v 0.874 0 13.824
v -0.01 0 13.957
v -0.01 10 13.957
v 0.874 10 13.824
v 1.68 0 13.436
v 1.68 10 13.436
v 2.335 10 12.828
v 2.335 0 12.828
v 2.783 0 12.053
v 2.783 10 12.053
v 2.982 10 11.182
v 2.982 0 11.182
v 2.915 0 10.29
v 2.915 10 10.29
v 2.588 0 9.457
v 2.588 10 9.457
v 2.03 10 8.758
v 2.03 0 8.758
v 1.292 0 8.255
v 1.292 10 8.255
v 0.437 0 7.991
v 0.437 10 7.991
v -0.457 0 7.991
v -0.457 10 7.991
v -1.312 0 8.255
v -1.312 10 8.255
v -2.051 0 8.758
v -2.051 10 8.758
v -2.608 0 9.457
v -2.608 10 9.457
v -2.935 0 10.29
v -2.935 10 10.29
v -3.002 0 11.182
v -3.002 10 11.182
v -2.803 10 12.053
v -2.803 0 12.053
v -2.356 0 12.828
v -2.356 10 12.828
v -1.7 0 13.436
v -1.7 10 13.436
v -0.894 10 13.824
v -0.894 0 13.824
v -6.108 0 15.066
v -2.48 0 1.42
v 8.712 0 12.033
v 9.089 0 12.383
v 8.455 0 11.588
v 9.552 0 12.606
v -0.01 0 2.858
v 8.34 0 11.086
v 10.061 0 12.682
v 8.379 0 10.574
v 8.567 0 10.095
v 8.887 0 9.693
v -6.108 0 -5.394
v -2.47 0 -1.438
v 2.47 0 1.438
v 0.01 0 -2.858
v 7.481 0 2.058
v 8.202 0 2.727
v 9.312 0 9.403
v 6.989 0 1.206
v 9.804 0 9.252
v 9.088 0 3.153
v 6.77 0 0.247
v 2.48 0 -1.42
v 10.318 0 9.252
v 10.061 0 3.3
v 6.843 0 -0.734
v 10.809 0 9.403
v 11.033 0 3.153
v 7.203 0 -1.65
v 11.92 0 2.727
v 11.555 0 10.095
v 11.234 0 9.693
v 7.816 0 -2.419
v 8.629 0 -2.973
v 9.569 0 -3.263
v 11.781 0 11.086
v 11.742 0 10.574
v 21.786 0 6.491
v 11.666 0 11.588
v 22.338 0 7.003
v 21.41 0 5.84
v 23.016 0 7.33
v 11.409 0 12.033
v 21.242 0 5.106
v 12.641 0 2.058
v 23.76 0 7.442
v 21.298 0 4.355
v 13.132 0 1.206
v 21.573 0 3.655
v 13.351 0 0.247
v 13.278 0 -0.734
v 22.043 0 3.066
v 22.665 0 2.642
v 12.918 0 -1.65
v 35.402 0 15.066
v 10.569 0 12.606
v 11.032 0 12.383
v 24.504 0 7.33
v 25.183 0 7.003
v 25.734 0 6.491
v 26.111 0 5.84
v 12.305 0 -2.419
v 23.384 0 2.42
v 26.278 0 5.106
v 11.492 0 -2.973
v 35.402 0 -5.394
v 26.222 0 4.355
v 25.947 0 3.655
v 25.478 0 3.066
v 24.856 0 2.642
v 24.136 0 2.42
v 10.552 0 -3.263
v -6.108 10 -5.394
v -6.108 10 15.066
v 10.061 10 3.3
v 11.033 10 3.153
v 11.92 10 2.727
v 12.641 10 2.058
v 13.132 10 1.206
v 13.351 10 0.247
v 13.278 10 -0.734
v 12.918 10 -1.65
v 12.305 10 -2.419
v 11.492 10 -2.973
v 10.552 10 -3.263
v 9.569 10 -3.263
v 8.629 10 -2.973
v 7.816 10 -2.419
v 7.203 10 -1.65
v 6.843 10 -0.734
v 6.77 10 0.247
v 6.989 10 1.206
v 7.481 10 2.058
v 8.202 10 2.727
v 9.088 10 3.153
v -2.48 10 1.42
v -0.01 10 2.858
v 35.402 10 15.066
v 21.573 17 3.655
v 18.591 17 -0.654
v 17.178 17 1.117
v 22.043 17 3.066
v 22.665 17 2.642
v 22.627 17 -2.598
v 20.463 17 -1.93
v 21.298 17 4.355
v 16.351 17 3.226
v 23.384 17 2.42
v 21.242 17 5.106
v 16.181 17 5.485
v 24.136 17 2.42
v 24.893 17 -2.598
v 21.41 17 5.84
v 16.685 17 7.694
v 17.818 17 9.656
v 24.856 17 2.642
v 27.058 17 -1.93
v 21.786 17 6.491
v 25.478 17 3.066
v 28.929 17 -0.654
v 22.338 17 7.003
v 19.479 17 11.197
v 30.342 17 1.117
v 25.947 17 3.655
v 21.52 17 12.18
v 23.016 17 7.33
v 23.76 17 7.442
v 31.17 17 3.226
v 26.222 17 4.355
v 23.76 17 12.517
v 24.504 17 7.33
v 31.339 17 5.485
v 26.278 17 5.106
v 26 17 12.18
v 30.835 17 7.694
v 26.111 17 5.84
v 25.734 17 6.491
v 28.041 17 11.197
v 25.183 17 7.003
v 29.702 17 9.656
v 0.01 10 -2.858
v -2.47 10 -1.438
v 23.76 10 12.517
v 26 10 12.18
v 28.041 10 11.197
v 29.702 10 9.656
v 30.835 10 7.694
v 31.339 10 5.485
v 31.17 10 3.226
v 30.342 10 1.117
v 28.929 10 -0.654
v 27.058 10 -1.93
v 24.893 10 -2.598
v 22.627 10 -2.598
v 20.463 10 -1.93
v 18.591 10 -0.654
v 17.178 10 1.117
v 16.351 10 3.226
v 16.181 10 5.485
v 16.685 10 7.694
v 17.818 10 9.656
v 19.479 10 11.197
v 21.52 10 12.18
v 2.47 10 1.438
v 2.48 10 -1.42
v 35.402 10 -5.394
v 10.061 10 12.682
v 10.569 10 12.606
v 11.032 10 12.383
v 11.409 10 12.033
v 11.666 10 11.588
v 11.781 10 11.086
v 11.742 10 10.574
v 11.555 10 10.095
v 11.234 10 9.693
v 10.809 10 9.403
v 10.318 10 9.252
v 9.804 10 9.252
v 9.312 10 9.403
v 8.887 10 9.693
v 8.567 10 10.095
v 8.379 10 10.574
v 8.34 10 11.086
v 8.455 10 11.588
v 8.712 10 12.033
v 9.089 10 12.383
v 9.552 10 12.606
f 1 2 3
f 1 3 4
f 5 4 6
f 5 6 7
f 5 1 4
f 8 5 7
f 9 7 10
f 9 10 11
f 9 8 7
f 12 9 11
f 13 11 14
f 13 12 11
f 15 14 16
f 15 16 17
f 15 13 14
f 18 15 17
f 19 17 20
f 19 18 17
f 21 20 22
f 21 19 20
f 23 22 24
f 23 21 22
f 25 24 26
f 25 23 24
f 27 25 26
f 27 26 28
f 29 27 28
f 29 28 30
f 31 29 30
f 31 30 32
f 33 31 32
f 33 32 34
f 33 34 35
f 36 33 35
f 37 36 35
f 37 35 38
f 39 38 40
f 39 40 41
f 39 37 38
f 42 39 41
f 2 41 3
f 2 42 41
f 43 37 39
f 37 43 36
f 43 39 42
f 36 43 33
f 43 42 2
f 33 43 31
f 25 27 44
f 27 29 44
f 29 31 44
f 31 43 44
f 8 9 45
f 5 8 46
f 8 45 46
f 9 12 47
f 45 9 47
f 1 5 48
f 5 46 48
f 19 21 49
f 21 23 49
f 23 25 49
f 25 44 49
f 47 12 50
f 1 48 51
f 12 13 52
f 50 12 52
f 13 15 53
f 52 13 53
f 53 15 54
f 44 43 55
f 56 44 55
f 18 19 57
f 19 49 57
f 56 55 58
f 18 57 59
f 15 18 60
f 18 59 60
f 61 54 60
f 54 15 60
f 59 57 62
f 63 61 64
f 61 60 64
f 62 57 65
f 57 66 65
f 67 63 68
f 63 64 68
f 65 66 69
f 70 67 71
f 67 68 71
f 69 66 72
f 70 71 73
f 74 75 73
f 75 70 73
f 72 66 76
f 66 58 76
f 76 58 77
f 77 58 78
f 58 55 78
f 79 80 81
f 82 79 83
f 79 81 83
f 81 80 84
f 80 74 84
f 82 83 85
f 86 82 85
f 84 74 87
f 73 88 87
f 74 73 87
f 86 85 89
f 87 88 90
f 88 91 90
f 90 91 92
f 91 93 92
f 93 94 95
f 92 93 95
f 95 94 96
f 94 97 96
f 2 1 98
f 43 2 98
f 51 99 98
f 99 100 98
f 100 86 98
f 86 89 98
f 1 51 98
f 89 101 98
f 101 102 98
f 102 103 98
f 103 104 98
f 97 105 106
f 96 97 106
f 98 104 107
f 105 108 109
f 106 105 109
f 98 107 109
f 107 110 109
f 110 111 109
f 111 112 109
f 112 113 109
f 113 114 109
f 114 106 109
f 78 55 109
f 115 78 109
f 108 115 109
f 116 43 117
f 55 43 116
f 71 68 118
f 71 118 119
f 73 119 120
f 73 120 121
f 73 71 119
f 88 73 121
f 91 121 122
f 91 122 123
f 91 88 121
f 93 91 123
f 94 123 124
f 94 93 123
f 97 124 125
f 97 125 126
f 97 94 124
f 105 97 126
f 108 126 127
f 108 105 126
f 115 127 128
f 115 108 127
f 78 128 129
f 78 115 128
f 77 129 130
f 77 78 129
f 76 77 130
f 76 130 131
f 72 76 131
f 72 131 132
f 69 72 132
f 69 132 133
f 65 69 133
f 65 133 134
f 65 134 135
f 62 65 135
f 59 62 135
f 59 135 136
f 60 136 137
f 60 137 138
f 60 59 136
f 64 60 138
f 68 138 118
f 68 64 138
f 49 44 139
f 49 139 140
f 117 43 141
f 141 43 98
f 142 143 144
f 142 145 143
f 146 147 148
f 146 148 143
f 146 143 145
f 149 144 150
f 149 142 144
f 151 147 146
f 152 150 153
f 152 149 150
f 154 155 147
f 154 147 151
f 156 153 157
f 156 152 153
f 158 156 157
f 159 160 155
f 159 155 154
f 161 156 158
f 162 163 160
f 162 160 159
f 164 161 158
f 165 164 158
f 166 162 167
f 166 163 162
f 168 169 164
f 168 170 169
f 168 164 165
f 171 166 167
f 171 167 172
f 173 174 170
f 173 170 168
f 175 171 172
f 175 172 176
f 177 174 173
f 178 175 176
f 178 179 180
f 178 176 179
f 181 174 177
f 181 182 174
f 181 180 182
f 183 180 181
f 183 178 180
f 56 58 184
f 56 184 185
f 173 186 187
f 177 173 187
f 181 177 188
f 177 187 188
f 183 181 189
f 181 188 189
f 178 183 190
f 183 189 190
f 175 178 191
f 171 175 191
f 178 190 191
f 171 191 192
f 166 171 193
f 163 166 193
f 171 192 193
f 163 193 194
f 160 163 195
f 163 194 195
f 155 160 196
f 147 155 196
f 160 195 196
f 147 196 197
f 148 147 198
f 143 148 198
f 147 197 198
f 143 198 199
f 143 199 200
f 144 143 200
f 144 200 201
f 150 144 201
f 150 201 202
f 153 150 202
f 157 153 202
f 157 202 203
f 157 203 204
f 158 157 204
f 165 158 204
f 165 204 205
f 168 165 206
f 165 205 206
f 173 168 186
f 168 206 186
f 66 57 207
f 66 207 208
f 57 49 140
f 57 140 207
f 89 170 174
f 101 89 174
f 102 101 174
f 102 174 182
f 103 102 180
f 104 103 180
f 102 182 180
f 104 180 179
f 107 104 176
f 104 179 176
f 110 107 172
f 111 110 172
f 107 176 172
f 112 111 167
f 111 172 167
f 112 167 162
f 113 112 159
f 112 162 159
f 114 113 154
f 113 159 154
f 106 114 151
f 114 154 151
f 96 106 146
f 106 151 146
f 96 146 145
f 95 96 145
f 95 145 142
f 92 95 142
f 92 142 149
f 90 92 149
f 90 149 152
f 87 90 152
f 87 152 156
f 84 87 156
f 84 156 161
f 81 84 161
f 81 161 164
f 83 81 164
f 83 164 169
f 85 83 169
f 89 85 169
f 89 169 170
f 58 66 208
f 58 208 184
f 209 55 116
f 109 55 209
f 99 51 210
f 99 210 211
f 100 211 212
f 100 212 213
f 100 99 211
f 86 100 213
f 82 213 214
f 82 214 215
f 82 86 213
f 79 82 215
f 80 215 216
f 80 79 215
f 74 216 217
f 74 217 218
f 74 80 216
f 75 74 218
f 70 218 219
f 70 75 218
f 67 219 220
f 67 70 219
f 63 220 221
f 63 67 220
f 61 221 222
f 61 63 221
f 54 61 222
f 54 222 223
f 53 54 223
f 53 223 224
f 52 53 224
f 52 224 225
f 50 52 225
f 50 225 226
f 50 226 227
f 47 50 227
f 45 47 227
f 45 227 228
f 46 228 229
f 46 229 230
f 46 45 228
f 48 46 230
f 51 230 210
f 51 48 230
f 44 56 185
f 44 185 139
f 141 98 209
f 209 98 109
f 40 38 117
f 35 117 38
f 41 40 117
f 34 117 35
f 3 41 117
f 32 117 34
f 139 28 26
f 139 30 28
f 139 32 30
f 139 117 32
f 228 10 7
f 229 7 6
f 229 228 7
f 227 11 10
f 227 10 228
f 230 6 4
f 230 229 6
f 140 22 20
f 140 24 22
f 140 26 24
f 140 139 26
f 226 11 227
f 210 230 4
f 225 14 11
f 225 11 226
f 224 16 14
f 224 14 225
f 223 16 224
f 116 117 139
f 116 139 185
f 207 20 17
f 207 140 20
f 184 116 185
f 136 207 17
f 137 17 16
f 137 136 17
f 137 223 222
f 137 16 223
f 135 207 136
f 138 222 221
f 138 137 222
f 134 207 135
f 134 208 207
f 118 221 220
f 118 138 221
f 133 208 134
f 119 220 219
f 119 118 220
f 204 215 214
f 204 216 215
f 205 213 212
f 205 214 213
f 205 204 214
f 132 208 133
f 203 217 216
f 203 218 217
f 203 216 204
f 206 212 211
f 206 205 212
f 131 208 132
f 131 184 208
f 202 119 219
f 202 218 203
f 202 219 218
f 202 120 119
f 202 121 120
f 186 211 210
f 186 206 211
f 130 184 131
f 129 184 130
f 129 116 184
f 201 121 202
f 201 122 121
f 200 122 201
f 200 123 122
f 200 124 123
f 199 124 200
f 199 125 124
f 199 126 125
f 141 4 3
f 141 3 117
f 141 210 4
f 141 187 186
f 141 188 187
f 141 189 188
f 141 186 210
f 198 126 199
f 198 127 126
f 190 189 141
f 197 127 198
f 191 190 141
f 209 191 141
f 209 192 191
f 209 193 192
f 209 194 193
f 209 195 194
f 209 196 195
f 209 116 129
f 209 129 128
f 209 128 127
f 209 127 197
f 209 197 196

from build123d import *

# Parameters (mm, degrees)
SKETCH1_W           = 41.509557428
SKETCH1_H           = 20.45985577
SKETCH1_R           = 3
SKETCH1_R_2         = 3.3
SKETCH1_R_3         = 1.725
BOSS_EXTRUDE1_DEPTH = 10
SKETCH2_R           = 7.6
BOSS_EXTRUDE2_DEPTH = 7
SKETCH3_R           = 2.525
CUT_EXTRUDE1_DEPTH  = 43.062691409


with BuildPart() as part:
    # Sketch1 → Boss-Extrude1 (new body)
    with BuildSketch(Plane(origin=(0, 0, 0), x_dir=(1, 0, 0), z_dir=(0, 1, 0))):
        with Locations((14.647059063, -4.835923918)):
            Rectangle(SKETCH1_W, SKETCH1_H)
        with Locations(Location((-0.01006999, -10.957446633, 0), (0, 0, 270))):
            Circle(SKETCH1_R, mode=Mode.SUBTRACT)
        with Locations(Location((10.060612969, 0, 0), (0, 0, 270))):
            Circle(SKETCH1_R_2, mode=Mode.SUBTRACT)
        with Locations(Location((10.060612969, -10.957446633, 0), (0, 0, 270))):
            Circle(SKETCH1_R_3, mode=Mode.SUBTRACT)
        Polygon((2.480175999, 1.419939088), (0.010384677, 2.857864965), (-2.469791322, 1.437925877), (-2.480175999, -1.419939088), (-0.010384677, -2.857864965), (2.469791322, -1.437925877), align=None, mode=Mode.SUBTRACT)
    extrude(amount=BOSS_EXTRUDE1_DEPTH)

    # Sketch2 → Boss-Extrude2 (add)
    with BuildSketch(Plane(origin=(0, 10, 0), x_dir=(1, 0, 0), z_dir=(0, 1, 0))):
        with Locations(Location((23.760138251, -4.917169795, 0), (0, 0, 270))):
            Circle(SKETCH2_R)
    extrude(amount=BOSS_EXTRUDE2_DEPTH)

    # Sketch3 → Cut-Extrude1 (cut, through all)
    with BuildSketch(Plane(origin=(0, 17, 0), x_dir=(1, 0, 0), z_dir=(0, 1, 0))):
        with Locations(Location((23.760138251, -4.917169795, 0), (0, 0, 270))):
            Circle(SKETCH3_R)
    extrude(amount=-CUT_EXTRUDE1_DEPTH, mode=Mode.SUBTRACT)


solid = part.part
